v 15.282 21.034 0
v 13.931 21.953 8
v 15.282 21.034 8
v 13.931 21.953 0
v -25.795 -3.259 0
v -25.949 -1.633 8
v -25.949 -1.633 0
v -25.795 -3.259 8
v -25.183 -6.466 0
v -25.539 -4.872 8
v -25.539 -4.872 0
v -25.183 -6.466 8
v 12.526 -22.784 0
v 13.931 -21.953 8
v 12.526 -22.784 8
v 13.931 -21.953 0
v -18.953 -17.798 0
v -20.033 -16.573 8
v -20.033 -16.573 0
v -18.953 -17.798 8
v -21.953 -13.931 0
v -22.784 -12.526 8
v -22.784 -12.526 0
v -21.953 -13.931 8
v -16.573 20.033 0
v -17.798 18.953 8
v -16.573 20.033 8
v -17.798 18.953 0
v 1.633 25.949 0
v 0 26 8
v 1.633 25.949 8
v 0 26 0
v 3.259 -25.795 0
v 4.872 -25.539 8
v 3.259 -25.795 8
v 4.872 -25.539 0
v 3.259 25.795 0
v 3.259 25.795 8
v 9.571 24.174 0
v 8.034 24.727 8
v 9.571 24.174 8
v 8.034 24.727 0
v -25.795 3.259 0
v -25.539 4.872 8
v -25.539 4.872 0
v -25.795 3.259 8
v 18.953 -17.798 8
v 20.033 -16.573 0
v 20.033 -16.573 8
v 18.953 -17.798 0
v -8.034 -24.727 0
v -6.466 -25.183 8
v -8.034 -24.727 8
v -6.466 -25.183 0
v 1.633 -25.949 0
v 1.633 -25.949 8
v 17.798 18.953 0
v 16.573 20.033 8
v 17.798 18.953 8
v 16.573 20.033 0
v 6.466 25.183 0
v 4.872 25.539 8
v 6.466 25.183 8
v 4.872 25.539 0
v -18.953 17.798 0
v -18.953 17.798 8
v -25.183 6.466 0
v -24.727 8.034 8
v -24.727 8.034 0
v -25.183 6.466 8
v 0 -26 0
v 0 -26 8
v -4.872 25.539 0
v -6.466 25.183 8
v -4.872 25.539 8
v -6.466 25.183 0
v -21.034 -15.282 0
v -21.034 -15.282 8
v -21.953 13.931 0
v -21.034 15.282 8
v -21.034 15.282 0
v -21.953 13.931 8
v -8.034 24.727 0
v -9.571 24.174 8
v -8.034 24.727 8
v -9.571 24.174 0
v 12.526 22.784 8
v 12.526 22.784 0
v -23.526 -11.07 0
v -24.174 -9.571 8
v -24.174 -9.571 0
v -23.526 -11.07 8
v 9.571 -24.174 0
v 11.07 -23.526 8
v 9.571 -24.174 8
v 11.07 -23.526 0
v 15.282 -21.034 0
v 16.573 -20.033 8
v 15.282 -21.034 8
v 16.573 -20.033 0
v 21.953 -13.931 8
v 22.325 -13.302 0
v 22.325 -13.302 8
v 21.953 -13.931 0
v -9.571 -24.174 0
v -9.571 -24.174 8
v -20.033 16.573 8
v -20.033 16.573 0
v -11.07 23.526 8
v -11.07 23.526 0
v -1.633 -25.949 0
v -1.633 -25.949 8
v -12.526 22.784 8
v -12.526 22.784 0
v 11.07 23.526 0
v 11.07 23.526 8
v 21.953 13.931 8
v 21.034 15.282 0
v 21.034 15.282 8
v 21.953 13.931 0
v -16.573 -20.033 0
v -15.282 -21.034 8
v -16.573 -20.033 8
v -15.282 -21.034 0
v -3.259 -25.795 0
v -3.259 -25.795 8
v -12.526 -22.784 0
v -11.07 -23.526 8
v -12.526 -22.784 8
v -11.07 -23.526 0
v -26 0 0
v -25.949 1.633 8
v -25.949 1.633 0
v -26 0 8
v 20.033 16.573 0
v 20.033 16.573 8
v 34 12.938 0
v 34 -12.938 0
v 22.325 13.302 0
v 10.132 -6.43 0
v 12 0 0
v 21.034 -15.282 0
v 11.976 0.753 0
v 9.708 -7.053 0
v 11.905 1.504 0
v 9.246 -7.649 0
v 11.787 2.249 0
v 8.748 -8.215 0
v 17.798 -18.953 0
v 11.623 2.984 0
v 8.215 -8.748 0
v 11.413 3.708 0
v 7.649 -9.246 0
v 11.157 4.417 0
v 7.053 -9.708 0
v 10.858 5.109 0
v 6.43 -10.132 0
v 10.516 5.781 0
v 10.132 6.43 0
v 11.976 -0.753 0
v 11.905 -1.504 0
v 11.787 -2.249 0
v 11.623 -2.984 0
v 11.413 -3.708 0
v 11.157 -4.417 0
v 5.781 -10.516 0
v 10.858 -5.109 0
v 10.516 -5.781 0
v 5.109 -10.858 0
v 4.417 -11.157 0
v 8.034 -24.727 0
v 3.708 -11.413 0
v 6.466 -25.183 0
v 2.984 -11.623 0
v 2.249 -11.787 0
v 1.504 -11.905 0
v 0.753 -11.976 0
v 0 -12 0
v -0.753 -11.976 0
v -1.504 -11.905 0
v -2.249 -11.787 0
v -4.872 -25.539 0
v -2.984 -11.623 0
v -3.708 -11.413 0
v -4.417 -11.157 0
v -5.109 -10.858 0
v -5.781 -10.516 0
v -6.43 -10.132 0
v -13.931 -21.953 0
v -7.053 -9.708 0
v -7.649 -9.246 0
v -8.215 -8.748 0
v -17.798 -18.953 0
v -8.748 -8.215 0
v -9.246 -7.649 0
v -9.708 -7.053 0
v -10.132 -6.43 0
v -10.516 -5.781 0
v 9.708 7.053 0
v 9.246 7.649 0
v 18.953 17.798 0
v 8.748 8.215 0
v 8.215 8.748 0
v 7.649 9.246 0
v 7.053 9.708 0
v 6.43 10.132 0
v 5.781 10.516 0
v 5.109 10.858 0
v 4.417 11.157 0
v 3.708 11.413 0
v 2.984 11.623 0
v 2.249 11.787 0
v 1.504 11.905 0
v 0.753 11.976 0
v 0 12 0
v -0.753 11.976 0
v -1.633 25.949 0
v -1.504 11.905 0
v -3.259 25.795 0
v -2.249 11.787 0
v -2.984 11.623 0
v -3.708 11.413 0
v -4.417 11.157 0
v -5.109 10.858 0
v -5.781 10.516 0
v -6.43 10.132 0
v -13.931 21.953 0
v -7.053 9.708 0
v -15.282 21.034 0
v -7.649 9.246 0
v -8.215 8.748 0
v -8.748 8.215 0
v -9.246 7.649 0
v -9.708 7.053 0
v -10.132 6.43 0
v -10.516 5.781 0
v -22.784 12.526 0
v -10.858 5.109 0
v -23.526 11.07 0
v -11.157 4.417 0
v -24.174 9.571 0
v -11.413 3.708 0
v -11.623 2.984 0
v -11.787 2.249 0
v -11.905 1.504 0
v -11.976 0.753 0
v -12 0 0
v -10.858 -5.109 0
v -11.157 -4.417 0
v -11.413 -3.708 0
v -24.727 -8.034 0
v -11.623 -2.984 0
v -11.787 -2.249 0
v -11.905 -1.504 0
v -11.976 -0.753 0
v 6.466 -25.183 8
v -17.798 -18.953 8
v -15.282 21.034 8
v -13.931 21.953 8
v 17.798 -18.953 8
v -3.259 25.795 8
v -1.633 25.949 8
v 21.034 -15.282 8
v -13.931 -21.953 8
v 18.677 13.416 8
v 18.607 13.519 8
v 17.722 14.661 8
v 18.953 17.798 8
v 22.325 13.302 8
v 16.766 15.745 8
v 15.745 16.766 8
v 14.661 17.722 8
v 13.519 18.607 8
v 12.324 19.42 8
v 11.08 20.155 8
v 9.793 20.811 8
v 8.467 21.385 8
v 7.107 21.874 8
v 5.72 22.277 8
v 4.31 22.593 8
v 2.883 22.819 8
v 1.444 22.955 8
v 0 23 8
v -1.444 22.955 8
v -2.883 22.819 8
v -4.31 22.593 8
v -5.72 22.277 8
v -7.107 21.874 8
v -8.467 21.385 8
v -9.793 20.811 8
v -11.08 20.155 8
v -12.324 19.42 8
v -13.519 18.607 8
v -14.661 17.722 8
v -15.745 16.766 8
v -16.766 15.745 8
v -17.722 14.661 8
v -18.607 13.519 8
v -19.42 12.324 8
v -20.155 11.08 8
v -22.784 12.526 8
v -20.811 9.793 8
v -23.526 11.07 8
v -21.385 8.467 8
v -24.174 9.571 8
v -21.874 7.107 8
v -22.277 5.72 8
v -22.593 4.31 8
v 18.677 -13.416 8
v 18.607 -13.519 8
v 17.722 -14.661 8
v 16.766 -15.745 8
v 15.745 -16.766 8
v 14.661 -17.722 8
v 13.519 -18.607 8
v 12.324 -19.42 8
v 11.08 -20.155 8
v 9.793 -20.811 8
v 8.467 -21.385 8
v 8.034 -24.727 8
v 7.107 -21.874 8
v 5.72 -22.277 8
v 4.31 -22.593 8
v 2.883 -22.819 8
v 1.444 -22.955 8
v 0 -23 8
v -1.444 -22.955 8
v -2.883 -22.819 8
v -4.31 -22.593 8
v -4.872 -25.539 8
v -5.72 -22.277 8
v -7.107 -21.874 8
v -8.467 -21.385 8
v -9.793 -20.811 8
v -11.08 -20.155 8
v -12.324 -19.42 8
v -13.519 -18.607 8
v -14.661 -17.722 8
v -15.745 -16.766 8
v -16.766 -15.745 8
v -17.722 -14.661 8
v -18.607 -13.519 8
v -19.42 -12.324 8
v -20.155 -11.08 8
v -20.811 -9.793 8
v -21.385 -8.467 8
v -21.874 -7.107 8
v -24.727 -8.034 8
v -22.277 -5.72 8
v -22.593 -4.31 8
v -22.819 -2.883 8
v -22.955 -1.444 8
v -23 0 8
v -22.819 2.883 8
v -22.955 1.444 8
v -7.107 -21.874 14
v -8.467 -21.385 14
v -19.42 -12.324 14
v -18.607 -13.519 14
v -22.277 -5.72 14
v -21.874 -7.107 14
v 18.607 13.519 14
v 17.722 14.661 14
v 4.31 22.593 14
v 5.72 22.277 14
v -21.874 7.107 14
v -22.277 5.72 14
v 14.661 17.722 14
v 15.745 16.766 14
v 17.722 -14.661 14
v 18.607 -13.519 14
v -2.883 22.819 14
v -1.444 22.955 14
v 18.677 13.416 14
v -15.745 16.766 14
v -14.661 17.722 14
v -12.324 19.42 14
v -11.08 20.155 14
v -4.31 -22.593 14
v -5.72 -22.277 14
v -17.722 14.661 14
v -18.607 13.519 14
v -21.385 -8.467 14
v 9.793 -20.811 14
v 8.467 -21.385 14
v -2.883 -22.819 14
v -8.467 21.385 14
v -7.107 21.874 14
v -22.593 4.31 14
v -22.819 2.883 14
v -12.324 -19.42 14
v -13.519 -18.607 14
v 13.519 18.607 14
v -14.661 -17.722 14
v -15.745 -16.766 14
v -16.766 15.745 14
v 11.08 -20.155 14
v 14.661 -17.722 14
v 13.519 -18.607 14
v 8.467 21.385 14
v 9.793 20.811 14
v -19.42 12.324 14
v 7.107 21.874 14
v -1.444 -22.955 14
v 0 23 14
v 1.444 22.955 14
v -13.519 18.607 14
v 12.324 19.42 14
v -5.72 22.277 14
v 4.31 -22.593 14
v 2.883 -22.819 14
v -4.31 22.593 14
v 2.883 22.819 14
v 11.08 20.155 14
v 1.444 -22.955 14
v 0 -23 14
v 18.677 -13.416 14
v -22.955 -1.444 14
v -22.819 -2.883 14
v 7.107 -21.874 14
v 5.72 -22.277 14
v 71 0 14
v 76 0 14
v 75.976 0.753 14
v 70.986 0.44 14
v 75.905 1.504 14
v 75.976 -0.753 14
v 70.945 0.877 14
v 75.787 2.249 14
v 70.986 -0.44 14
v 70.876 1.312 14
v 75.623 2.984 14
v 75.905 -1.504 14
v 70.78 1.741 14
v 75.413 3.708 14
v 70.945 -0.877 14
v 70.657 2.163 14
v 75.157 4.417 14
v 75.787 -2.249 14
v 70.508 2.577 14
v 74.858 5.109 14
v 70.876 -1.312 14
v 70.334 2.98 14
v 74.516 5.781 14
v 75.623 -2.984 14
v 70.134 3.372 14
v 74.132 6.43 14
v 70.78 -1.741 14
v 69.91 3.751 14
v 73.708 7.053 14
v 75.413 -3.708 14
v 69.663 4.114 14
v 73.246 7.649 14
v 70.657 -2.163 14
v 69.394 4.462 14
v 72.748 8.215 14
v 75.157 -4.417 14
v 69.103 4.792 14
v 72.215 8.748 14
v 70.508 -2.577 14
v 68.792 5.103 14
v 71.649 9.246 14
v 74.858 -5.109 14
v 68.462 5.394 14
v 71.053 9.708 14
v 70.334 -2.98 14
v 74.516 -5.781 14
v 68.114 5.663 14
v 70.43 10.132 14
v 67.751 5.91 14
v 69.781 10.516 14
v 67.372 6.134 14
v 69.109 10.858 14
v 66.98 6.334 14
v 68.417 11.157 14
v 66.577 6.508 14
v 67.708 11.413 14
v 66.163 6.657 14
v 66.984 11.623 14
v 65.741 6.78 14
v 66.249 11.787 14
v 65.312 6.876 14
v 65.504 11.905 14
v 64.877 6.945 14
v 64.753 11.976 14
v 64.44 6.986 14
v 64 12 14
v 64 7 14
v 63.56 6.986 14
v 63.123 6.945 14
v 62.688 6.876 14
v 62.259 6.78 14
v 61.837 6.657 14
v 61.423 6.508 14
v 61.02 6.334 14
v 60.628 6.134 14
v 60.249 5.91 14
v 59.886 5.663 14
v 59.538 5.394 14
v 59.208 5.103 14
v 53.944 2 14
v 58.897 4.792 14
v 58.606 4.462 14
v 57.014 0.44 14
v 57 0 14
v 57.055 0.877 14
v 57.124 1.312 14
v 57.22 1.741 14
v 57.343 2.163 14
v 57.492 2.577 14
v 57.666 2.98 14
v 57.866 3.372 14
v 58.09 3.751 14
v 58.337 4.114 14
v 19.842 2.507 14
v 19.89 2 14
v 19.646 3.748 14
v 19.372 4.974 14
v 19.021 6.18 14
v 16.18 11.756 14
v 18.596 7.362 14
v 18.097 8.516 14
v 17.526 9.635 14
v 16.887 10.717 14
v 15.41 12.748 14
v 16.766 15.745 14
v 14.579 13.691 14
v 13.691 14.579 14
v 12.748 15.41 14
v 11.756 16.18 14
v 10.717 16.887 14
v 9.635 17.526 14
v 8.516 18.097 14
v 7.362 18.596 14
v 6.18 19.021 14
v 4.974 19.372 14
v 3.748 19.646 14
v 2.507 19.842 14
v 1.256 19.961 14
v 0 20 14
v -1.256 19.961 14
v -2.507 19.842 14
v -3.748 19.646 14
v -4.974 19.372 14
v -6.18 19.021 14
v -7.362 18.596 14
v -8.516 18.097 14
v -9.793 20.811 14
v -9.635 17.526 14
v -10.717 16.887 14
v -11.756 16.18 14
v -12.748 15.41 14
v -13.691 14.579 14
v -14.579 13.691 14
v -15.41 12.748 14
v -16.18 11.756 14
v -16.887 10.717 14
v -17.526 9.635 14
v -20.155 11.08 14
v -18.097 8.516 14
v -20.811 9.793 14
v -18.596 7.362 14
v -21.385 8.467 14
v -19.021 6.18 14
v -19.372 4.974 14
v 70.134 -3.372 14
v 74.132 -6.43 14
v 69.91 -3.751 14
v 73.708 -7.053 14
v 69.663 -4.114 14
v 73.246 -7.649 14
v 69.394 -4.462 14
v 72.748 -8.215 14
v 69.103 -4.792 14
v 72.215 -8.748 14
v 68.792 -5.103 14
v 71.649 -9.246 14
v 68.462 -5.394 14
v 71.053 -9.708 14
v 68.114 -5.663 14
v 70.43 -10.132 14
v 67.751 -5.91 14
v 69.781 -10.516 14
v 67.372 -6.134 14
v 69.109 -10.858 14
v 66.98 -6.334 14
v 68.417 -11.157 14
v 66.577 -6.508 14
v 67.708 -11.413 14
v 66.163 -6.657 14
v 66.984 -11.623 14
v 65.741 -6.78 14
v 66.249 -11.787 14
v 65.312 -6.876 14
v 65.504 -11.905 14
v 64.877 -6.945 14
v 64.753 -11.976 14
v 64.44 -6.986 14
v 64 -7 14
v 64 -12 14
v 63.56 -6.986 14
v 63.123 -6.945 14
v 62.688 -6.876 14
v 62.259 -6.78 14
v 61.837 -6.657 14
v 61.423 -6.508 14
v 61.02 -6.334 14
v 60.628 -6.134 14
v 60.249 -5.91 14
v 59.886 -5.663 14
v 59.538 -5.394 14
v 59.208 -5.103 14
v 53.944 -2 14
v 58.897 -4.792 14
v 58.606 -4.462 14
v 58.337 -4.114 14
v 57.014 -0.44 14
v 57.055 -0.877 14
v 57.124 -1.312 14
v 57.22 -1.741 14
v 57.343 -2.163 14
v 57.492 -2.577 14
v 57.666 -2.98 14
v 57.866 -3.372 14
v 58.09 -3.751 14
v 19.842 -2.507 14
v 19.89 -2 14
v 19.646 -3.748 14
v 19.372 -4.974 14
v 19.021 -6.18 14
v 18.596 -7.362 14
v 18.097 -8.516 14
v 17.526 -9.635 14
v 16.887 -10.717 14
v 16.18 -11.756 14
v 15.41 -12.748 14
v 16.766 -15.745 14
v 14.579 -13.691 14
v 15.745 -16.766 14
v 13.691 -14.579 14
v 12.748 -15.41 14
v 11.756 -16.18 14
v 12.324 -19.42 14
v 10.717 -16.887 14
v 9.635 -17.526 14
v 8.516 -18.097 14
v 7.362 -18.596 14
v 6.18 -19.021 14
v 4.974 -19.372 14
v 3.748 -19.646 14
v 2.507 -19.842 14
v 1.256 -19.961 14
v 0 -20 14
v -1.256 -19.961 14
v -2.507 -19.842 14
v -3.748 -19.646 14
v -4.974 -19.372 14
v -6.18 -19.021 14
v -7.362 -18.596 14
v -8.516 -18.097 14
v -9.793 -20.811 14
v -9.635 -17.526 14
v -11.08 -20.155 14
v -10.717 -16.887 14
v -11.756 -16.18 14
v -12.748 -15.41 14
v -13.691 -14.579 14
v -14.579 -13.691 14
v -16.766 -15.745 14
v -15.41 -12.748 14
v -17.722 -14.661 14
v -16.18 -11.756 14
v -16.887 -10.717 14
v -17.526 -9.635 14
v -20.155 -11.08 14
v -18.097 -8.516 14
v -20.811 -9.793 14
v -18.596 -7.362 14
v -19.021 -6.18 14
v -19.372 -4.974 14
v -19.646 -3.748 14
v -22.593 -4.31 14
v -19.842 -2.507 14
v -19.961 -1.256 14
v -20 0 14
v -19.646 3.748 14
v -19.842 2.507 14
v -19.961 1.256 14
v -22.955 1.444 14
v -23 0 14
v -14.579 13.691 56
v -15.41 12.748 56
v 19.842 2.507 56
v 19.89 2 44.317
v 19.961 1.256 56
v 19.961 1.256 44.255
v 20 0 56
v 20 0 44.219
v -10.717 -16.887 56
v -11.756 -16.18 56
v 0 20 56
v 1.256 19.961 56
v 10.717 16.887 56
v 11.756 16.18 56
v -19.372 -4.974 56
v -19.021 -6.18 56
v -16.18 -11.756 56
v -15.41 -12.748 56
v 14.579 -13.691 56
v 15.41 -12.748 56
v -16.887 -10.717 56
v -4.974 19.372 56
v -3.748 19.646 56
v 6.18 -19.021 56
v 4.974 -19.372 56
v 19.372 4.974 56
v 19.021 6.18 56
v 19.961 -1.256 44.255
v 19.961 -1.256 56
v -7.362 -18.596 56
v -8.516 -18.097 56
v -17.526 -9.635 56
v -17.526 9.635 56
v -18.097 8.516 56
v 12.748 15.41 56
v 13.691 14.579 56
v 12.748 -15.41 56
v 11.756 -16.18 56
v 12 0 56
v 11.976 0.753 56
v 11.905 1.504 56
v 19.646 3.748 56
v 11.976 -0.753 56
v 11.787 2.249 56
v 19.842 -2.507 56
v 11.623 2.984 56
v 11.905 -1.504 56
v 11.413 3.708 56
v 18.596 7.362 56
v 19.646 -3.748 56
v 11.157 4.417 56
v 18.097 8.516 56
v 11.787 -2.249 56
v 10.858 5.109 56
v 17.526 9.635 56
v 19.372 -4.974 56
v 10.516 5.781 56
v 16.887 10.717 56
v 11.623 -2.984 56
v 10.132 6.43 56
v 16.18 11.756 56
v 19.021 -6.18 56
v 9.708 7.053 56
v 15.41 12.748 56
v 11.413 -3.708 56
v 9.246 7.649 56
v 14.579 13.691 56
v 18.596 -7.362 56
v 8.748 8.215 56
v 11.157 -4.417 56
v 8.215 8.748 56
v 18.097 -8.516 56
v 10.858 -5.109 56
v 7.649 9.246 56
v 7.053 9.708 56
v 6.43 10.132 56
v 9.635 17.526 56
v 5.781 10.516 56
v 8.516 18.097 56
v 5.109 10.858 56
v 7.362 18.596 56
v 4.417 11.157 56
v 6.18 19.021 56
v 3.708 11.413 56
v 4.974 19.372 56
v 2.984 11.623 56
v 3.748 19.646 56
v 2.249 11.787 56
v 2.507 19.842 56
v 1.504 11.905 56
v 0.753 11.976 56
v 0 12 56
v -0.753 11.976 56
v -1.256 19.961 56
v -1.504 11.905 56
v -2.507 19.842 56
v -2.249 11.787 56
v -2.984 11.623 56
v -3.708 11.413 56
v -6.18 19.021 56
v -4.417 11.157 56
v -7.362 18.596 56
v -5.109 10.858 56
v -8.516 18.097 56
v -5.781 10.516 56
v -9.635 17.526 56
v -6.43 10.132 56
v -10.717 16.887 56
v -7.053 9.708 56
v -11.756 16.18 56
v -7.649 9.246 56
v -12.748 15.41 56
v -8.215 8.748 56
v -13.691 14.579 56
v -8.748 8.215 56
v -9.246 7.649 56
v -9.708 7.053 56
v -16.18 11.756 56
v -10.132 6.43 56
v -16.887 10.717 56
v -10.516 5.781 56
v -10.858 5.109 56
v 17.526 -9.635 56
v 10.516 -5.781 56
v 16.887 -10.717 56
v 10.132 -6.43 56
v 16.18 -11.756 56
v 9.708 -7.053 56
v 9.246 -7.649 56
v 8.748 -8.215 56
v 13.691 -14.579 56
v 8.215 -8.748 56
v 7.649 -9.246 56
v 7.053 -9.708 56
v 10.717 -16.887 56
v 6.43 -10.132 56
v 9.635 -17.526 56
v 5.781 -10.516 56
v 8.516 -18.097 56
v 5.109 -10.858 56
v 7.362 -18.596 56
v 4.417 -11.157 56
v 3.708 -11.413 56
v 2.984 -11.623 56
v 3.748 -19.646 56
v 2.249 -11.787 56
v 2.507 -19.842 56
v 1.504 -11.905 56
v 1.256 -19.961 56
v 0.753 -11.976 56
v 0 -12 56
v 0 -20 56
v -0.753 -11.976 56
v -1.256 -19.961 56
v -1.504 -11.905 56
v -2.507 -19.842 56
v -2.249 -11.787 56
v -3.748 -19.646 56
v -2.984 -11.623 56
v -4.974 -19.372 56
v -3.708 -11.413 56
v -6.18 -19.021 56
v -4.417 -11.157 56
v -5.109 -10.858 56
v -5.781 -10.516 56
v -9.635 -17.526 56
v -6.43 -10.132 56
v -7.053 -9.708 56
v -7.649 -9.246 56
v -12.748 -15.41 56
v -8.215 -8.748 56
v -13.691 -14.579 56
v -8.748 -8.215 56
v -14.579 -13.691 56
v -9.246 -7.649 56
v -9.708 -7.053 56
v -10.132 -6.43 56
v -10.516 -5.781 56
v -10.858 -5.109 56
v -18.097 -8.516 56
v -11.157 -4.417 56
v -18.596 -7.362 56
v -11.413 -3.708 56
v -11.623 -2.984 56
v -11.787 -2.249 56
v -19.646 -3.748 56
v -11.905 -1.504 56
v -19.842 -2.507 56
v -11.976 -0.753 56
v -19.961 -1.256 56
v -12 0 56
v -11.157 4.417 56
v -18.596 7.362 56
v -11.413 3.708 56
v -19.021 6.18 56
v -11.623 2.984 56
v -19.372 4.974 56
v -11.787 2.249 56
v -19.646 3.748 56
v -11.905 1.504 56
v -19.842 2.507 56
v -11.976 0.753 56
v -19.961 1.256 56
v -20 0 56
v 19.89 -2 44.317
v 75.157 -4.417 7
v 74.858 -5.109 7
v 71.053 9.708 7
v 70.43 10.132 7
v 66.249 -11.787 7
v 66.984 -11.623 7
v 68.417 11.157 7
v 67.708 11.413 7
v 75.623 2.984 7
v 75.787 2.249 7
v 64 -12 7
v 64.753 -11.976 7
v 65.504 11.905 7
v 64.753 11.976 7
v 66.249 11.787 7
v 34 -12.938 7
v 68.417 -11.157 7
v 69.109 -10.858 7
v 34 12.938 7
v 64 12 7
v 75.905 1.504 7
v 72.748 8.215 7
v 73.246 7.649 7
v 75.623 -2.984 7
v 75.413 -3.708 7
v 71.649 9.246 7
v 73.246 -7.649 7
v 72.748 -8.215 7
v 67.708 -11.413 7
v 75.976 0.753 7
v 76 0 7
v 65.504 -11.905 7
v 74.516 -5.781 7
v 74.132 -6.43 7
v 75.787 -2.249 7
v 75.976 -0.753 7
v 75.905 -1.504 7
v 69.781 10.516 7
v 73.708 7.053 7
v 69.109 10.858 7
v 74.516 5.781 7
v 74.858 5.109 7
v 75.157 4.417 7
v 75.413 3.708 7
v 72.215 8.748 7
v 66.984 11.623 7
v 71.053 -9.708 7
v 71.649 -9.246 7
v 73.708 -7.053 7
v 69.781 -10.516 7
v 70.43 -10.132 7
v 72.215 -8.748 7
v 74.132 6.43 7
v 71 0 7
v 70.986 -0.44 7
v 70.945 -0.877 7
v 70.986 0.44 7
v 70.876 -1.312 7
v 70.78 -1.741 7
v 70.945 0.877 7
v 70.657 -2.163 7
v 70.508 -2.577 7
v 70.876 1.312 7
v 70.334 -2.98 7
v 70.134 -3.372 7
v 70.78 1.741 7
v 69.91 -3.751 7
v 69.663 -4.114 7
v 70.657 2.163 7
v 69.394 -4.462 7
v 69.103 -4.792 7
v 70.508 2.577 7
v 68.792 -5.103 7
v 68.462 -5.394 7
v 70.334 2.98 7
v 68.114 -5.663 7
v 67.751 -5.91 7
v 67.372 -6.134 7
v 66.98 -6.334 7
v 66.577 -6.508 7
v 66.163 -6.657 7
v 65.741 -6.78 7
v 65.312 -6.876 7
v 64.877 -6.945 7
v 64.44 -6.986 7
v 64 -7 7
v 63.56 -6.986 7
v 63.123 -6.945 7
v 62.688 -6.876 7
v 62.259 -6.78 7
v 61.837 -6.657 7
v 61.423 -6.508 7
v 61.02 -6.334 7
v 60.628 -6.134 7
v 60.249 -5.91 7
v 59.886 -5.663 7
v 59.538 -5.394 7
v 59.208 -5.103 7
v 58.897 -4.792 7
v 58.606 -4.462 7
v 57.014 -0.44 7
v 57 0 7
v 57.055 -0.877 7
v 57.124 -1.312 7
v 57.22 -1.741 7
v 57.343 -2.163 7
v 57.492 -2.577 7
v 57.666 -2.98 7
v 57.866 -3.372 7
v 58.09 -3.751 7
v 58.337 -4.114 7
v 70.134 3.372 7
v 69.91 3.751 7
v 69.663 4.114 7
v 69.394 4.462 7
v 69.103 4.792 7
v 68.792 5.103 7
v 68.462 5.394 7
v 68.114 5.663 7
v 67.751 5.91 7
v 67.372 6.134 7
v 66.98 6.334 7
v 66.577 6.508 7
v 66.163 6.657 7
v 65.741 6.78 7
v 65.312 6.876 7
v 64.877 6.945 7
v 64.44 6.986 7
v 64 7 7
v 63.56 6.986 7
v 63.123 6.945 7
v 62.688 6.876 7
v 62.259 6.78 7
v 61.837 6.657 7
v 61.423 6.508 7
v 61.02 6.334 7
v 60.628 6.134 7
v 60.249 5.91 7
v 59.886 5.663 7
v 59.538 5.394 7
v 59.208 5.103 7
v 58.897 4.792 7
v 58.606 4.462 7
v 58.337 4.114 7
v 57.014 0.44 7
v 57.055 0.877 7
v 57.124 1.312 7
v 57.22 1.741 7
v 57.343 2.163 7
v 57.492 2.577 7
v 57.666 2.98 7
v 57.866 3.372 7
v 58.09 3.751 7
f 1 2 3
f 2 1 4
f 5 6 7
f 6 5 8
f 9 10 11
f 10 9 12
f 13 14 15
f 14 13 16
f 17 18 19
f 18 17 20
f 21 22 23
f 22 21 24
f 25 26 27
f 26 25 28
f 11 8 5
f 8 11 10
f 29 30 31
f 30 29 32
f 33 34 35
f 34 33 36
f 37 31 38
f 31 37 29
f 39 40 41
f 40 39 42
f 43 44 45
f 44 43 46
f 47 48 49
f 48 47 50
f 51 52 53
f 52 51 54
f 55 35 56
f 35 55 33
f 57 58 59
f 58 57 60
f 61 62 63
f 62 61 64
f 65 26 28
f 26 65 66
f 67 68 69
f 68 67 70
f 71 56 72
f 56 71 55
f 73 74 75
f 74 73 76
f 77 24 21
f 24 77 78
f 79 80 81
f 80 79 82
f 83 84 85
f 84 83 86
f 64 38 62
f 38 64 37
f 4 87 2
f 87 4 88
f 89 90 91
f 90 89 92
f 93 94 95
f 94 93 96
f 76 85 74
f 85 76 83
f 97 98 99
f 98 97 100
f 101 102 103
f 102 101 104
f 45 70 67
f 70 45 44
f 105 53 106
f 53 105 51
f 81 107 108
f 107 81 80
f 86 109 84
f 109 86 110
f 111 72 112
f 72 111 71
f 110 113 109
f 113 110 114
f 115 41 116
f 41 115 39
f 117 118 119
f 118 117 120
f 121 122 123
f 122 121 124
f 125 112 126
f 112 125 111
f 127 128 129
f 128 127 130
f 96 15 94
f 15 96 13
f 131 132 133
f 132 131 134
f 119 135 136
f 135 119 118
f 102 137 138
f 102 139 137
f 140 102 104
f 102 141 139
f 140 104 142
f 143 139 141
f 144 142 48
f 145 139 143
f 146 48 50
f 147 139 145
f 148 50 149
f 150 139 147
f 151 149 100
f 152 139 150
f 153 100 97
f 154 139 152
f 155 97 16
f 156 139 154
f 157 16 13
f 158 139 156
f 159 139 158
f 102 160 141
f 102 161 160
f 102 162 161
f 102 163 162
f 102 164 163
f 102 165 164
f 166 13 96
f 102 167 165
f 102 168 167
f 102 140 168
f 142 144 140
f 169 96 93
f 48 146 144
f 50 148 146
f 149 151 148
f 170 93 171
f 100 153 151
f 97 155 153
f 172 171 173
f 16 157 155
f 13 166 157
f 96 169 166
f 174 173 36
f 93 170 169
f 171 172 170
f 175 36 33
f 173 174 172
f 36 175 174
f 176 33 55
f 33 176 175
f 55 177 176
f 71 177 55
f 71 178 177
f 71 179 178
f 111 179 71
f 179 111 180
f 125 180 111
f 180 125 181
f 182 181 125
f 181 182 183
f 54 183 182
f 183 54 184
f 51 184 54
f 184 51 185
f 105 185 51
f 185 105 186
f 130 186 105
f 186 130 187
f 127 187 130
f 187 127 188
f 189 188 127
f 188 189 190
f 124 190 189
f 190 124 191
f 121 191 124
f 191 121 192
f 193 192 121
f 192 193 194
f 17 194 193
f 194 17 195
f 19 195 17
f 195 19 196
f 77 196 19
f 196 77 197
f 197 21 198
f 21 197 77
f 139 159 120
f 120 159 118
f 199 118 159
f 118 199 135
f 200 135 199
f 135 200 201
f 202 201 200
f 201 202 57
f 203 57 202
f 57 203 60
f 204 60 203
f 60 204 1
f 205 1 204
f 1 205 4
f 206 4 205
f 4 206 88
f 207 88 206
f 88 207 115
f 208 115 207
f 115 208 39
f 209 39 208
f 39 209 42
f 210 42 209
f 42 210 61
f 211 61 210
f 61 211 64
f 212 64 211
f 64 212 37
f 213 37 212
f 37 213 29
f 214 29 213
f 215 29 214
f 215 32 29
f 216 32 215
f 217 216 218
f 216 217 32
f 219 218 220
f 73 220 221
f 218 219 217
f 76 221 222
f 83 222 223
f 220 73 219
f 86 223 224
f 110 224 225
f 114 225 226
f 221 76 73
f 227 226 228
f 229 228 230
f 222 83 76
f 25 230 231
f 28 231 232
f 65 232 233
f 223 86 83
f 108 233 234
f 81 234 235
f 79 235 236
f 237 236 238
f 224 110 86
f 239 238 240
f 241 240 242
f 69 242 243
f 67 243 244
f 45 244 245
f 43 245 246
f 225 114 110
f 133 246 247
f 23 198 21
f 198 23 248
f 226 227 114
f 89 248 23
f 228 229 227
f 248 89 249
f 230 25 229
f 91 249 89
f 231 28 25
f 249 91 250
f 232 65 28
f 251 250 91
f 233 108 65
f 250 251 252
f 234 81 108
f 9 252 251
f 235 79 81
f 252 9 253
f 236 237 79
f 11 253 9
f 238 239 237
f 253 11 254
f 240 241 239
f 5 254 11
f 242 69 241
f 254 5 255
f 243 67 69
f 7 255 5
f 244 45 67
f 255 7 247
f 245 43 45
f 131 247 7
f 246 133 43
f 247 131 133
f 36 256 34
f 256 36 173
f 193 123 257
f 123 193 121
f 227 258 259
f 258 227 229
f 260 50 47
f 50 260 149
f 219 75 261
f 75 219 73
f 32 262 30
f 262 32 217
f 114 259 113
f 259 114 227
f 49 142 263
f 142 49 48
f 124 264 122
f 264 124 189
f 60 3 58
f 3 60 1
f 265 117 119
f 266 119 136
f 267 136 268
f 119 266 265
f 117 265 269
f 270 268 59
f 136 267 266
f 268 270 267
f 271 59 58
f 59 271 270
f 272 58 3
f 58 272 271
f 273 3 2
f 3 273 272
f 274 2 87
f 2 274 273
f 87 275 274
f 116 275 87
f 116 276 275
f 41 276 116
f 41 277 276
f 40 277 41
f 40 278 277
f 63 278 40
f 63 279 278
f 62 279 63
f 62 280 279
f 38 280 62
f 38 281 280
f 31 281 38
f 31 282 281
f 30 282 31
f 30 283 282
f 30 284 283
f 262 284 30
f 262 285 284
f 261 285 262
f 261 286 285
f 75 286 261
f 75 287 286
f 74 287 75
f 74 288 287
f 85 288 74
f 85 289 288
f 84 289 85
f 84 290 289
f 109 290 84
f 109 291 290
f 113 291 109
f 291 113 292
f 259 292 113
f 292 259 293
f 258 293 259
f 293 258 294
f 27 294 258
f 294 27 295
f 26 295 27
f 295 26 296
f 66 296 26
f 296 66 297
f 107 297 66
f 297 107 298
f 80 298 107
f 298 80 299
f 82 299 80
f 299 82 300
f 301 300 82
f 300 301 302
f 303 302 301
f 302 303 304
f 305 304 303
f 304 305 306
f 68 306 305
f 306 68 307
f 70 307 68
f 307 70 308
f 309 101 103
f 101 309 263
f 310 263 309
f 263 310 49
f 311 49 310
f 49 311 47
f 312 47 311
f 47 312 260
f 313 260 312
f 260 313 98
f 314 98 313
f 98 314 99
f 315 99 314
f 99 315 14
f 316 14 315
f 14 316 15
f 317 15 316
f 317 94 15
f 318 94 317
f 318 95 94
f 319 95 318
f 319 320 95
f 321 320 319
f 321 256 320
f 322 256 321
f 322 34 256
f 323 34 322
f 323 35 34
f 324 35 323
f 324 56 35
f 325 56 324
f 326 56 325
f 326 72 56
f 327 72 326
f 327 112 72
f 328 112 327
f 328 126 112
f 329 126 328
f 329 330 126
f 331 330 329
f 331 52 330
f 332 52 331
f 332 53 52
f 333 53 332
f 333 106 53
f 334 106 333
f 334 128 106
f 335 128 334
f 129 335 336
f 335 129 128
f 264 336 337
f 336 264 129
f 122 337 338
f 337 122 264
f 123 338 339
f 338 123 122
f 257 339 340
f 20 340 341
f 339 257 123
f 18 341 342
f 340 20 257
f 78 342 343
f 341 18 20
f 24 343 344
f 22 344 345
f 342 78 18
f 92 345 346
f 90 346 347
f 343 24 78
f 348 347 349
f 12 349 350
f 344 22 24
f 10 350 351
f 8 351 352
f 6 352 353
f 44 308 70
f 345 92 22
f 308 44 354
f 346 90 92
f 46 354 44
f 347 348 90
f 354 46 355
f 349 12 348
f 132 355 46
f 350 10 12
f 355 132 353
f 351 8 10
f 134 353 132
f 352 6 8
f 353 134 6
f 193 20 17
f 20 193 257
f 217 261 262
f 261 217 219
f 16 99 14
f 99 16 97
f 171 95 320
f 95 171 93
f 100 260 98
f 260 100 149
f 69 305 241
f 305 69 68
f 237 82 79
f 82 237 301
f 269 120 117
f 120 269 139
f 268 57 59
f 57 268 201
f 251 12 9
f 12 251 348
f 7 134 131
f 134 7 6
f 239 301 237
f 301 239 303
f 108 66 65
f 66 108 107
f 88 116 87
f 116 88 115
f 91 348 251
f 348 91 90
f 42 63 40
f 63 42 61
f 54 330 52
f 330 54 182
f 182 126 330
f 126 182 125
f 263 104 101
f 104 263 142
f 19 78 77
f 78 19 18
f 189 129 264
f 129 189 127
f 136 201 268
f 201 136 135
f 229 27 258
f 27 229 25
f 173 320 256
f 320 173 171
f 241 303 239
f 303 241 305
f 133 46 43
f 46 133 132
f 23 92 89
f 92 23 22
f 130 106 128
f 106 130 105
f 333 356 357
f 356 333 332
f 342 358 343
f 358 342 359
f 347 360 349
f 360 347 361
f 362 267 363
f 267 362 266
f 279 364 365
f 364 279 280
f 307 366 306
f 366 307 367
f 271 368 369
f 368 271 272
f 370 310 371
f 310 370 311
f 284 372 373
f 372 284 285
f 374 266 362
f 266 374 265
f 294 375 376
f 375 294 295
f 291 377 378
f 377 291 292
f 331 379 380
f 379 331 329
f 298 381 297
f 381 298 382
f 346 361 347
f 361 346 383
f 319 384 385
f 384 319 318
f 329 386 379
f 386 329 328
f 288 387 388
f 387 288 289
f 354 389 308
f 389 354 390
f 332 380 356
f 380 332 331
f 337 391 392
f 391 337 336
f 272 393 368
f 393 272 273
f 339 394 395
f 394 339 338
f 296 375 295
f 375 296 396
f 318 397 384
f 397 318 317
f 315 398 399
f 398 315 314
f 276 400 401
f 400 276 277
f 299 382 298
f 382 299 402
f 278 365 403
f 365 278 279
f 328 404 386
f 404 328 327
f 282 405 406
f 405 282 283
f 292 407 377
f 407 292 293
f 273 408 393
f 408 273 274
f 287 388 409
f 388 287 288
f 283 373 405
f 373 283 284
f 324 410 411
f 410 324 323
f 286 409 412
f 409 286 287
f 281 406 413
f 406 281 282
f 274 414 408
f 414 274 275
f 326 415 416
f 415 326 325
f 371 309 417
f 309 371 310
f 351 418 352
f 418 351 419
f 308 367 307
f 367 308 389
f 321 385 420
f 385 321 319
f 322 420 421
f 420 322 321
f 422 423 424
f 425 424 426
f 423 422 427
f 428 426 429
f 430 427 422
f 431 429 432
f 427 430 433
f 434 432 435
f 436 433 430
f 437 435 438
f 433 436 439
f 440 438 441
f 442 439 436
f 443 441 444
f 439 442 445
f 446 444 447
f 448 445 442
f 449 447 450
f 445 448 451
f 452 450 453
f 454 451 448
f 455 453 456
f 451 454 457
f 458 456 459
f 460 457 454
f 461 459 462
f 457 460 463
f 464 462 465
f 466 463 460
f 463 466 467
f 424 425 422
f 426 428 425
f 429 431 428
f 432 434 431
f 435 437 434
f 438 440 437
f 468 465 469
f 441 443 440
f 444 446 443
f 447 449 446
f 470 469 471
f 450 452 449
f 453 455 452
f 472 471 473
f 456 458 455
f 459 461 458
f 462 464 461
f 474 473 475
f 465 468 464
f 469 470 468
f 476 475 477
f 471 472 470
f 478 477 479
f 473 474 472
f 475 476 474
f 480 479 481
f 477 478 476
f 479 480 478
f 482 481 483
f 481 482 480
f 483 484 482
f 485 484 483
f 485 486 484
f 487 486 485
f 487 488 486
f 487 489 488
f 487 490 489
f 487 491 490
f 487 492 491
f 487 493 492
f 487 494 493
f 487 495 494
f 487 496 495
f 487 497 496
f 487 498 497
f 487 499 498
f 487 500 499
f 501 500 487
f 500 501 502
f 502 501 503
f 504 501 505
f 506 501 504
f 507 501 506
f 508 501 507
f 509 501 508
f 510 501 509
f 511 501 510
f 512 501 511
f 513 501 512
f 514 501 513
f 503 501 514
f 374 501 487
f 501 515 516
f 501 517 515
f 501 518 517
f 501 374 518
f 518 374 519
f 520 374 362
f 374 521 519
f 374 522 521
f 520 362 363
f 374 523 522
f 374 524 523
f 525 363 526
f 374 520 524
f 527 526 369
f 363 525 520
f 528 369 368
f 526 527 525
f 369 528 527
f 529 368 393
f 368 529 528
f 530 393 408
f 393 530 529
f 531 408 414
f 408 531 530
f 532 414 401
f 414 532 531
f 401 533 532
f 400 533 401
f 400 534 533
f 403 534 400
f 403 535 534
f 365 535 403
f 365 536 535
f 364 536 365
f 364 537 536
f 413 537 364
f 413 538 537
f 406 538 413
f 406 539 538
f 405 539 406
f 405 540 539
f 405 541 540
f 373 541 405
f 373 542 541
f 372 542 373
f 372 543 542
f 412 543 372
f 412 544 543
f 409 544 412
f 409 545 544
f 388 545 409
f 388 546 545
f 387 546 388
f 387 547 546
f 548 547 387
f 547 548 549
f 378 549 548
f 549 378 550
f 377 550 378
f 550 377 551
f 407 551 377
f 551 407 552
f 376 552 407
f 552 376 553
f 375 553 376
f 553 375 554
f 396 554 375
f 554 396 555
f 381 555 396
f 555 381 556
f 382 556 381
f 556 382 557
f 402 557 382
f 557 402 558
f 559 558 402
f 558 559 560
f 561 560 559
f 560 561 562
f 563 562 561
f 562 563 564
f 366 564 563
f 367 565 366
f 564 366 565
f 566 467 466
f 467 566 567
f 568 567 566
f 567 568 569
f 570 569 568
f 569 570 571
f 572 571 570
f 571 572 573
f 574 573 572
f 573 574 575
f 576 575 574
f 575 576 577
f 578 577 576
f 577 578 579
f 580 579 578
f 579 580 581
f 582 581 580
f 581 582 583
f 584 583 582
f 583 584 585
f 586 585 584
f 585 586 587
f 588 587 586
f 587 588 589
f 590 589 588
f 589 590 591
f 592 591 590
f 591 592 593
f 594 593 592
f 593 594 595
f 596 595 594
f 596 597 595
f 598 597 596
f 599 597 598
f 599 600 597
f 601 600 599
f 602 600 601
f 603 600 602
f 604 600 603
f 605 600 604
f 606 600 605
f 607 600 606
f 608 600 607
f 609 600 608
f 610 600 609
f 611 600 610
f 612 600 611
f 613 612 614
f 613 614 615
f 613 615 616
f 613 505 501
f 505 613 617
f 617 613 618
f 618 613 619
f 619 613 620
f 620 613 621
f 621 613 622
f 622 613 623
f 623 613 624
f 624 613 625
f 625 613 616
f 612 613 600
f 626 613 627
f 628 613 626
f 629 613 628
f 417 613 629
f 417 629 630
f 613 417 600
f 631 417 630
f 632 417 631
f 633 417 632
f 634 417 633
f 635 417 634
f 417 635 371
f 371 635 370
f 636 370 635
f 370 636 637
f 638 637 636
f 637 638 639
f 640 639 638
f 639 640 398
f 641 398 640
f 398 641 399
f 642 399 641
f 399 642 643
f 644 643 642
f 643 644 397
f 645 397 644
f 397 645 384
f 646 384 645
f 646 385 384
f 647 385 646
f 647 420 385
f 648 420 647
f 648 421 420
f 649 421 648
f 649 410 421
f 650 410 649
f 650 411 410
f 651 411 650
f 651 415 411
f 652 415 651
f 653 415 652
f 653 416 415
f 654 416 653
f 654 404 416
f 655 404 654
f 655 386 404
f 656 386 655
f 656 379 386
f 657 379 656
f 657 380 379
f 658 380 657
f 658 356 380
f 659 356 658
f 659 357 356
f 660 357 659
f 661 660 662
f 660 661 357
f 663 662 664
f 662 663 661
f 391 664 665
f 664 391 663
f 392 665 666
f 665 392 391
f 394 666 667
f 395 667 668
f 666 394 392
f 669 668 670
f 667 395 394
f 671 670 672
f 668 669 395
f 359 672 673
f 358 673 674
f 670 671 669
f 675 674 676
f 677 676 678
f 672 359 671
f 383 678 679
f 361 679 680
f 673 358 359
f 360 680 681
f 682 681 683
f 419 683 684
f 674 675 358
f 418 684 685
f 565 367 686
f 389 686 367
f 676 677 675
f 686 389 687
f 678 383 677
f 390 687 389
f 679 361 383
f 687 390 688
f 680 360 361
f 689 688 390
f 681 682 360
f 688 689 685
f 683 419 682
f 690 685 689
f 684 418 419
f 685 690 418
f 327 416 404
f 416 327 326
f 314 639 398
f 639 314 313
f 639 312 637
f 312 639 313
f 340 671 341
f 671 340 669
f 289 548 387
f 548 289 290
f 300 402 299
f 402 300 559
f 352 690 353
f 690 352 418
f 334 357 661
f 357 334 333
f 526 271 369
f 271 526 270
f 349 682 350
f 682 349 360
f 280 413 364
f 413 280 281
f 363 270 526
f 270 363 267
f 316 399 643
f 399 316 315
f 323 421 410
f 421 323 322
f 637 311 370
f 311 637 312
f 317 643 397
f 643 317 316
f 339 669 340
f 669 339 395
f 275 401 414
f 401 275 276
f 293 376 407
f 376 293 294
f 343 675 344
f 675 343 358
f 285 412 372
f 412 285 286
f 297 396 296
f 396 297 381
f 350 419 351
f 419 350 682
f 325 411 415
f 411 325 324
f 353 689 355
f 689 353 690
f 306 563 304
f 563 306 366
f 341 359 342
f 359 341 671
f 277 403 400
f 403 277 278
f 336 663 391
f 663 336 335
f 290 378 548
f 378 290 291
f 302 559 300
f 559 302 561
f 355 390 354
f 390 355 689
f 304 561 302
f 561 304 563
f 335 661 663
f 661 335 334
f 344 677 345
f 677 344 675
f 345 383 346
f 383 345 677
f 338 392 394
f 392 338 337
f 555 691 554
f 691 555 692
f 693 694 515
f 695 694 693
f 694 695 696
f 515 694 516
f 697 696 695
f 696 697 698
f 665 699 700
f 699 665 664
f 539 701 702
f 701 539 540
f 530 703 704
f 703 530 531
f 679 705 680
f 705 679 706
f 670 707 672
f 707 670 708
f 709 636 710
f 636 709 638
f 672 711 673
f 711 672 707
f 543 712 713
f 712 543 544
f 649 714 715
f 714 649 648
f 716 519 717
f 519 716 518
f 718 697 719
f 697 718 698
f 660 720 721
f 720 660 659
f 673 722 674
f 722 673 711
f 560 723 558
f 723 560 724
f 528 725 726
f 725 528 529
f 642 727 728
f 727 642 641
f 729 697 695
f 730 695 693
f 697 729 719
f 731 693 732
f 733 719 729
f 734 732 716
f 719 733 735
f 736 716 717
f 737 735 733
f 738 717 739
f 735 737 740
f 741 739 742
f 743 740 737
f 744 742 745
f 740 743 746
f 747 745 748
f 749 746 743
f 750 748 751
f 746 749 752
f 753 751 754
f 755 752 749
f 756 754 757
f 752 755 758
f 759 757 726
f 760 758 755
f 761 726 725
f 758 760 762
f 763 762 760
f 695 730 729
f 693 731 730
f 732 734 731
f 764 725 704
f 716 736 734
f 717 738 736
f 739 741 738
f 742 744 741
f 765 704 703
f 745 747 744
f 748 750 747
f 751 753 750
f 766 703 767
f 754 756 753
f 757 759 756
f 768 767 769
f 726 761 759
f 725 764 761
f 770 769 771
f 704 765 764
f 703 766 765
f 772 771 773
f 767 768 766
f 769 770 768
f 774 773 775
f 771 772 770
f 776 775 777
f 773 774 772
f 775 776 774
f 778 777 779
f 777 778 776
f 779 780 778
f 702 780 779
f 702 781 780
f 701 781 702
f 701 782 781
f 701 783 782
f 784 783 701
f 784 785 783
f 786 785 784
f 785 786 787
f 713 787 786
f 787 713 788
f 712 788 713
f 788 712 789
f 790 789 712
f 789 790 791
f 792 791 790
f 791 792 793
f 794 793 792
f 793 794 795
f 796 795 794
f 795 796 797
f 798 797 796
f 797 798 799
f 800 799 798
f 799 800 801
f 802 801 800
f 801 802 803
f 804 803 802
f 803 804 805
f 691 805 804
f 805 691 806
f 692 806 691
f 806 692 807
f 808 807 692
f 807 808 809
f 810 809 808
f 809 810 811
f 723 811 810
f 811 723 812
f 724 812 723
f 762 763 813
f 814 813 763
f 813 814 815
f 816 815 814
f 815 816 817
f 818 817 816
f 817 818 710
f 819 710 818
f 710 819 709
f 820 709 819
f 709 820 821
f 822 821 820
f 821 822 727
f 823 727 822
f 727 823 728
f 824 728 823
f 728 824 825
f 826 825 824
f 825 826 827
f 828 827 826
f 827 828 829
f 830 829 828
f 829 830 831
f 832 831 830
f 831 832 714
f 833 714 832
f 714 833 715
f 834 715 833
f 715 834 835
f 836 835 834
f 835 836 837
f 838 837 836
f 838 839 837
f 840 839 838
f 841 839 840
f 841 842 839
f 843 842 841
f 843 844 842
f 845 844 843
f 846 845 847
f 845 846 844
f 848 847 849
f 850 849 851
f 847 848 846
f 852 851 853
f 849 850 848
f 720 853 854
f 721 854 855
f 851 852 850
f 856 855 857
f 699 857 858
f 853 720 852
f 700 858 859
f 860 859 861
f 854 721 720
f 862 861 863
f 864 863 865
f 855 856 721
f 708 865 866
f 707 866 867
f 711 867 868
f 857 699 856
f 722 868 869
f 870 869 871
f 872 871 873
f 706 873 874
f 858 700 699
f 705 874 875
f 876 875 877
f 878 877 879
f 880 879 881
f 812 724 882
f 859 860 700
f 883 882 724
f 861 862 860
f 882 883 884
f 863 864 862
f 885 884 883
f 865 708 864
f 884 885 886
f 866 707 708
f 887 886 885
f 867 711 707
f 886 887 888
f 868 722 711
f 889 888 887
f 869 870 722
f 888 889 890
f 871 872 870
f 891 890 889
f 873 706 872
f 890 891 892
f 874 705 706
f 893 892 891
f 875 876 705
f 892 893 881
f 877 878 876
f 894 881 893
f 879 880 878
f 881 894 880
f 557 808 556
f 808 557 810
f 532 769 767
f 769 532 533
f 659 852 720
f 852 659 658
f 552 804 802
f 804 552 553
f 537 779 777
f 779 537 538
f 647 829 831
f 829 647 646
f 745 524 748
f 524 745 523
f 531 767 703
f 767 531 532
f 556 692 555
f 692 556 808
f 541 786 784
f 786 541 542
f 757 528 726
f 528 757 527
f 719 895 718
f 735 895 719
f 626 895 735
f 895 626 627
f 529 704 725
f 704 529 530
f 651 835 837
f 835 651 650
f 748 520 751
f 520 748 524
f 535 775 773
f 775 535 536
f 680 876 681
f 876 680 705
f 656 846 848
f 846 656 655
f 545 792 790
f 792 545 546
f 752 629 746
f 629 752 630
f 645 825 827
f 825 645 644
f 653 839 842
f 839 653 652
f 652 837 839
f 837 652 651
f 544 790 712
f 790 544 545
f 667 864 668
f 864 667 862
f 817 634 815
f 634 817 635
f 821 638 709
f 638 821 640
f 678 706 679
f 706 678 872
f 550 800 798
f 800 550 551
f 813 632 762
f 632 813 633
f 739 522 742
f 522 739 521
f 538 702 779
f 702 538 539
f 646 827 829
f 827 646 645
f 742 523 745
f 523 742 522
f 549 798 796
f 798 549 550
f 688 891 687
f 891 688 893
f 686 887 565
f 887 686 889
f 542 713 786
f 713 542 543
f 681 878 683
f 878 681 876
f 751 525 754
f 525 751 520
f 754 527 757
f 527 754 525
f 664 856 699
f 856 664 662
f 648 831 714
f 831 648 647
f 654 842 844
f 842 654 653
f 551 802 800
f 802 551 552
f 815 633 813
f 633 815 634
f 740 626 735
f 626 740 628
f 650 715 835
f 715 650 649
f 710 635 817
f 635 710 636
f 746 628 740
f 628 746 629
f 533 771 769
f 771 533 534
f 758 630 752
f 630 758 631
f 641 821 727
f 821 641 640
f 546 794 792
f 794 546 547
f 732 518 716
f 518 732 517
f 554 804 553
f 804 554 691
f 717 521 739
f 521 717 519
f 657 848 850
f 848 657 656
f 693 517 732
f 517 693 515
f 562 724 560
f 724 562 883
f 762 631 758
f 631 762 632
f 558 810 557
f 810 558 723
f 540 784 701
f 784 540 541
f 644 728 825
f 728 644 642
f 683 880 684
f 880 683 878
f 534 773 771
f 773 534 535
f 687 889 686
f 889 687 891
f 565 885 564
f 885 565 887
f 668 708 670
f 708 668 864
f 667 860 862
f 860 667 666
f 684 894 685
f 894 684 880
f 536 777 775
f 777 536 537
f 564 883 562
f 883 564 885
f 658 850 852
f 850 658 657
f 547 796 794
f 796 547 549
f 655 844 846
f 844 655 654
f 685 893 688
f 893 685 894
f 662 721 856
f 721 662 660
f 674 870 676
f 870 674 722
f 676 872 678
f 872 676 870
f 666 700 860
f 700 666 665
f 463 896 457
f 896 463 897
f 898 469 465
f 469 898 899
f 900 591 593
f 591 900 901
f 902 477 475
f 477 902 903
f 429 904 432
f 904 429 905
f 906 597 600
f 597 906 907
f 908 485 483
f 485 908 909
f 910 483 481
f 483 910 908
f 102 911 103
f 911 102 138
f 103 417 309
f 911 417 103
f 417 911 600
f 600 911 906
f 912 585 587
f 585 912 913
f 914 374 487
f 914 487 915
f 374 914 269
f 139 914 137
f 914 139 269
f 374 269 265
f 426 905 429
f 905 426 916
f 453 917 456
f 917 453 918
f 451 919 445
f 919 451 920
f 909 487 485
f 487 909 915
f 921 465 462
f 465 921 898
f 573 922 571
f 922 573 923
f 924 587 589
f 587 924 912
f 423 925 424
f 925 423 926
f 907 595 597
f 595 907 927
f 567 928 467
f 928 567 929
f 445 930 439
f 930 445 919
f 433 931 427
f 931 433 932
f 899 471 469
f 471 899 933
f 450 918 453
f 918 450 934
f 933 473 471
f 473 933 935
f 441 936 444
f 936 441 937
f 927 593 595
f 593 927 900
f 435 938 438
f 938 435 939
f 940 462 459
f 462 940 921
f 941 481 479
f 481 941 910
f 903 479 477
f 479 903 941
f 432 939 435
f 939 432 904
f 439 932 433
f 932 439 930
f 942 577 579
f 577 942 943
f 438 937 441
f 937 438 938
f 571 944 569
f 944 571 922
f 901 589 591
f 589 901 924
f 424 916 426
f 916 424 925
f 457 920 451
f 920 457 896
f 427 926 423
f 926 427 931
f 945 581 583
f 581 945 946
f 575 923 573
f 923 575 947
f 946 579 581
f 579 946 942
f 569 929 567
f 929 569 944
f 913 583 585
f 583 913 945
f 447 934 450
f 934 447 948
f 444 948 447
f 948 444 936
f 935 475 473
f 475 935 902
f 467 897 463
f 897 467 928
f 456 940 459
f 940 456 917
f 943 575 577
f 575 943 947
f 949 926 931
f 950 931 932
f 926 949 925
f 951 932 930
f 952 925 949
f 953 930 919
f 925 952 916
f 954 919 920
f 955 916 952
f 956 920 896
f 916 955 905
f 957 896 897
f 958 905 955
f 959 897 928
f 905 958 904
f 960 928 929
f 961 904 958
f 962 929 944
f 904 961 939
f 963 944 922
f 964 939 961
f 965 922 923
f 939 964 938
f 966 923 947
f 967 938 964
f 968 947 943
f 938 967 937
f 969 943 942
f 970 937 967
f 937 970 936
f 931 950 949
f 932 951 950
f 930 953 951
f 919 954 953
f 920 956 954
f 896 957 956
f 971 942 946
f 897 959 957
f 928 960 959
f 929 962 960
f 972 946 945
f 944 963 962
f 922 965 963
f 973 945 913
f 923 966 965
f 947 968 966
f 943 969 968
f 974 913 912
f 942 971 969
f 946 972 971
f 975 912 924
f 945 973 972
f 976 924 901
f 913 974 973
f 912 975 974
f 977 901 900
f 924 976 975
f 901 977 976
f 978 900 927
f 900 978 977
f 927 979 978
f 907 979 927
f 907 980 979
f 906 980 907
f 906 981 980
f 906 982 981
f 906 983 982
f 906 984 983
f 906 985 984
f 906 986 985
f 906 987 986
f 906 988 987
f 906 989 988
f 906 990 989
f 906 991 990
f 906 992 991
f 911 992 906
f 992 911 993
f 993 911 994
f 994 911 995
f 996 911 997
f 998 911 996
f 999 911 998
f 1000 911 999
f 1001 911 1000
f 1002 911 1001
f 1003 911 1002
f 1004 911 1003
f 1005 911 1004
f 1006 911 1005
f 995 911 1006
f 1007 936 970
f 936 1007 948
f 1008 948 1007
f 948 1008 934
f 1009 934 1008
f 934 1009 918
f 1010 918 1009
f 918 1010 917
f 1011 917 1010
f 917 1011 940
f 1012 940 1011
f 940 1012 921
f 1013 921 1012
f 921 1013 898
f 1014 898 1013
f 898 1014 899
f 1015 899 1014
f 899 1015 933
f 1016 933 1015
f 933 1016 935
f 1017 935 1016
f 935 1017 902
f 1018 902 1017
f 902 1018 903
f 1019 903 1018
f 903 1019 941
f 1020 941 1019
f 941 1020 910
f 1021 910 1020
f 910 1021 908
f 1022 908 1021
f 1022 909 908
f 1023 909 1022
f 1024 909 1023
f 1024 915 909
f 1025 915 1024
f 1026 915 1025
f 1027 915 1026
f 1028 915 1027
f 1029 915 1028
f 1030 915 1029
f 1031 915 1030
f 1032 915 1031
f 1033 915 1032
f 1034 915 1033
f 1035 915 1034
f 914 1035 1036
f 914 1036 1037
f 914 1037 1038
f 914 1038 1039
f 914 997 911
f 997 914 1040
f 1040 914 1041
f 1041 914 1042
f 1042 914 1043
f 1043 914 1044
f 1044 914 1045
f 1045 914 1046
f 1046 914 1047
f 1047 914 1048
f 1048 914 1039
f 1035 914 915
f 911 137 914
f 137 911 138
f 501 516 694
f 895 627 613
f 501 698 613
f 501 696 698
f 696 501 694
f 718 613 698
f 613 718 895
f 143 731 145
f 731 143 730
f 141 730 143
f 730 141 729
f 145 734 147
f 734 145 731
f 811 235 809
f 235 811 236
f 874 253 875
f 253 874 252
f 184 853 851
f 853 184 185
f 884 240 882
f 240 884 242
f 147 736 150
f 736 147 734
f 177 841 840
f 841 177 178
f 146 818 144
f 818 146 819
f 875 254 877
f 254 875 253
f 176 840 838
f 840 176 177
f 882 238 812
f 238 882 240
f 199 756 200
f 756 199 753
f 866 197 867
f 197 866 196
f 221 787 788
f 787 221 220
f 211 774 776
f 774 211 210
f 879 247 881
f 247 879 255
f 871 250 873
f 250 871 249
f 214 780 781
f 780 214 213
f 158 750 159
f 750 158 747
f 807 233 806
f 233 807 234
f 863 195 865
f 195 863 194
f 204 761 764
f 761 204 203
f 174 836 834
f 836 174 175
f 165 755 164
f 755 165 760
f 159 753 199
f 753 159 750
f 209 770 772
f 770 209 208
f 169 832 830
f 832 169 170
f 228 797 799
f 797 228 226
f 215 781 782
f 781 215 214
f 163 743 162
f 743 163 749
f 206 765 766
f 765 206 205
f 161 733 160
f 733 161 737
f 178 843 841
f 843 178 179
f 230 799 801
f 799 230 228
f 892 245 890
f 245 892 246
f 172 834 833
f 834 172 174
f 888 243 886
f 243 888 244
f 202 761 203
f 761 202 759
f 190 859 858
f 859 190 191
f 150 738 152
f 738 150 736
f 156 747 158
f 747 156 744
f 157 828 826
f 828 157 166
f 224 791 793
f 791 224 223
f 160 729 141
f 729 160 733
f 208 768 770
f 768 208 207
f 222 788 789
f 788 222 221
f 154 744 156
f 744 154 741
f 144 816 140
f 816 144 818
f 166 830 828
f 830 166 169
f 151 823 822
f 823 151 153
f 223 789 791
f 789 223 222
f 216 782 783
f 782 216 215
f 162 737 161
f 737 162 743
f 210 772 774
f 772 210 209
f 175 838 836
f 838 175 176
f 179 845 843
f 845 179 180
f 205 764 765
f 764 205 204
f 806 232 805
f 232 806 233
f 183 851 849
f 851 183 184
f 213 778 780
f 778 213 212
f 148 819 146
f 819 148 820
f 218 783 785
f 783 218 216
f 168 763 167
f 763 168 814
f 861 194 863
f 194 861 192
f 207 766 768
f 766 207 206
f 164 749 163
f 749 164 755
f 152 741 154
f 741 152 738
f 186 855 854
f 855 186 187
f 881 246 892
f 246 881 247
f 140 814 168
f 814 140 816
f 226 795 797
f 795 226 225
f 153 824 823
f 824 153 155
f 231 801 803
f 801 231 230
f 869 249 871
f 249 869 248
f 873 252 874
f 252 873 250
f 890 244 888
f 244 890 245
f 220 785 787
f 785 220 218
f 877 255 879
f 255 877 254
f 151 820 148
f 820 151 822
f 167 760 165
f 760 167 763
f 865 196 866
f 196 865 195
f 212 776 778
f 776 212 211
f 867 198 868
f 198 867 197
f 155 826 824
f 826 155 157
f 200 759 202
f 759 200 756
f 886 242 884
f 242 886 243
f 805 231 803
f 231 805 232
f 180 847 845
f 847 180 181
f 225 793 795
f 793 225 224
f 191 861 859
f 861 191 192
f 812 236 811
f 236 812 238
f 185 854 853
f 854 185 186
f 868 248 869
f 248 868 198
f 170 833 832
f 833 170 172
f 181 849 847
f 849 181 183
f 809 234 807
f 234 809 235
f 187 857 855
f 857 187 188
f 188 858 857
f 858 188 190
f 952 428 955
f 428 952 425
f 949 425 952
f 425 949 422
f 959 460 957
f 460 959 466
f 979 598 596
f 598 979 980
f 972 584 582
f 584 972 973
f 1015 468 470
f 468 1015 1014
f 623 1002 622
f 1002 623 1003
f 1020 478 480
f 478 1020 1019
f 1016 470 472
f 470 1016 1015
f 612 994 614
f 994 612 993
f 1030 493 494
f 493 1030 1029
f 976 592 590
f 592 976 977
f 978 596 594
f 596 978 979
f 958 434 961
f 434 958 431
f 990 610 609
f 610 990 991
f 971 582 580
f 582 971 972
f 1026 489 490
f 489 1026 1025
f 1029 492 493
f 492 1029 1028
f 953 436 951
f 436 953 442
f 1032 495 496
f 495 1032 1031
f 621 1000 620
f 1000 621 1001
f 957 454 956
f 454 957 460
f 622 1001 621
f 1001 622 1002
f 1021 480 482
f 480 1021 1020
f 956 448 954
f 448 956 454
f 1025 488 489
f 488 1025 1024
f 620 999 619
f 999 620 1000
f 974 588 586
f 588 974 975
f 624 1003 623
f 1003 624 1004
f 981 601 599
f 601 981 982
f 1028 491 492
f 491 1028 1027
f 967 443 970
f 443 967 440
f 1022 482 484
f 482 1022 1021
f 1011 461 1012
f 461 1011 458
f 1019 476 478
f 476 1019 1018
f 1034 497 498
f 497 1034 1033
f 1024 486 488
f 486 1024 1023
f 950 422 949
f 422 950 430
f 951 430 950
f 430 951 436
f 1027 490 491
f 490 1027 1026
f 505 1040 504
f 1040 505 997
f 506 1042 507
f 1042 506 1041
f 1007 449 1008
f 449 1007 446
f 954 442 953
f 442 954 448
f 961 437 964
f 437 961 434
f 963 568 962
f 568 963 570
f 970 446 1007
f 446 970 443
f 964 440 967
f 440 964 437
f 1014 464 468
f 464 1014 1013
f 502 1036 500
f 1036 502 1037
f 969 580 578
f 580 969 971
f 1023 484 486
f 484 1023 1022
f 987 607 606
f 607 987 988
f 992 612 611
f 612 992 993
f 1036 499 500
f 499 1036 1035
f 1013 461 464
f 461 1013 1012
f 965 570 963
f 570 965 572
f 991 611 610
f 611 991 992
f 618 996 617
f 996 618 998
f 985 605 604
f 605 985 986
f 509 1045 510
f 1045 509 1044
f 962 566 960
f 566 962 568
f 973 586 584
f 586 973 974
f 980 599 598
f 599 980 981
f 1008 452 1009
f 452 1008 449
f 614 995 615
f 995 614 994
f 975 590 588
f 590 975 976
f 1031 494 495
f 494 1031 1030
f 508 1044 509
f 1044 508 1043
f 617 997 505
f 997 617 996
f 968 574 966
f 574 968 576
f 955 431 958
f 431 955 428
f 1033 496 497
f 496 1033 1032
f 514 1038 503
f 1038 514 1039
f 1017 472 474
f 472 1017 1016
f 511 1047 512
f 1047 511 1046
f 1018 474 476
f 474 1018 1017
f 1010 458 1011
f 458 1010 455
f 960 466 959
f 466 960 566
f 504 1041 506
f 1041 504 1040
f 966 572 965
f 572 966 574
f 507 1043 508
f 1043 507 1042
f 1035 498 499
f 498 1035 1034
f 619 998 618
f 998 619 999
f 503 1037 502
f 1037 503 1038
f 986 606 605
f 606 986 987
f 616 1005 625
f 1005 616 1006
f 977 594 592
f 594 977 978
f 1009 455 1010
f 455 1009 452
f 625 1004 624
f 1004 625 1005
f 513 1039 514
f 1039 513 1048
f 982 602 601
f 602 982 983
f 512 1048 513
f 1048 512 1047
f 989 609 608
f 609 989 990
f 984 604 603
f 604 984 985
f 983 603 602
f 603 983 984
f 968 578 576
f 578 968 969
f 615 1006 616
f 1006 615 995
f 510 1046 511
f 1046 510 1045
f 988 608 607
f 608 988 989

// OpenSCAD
// Parameters — millimeters
base_diameter = 52;
base_height = 8;

shoulder_diameter = 46;
shoulder_height = 6;

sleeve_outer_diameter = 40;
sleeve_height = 42;
bore_diameter = 24;

arm_length = 64;              // Sleeve axis to rounded-end axis
arm_root_width = 28;
arm_end_diameter = 24;
arm_height = 14;
cutaway_start = 34;            // Distance from sleeve axis
cutaway_height = 7;

end_hole_diameter = 14;

rib_thickness = 4;
rib_height = 32;
rib_sleeve_overlap = 2;
rib_hole_clearance = 3;

epsilon = 0.05;
$fn = 100;

// Derived dimensions
shoulder_z = base_height;
sleeve_z = base_height + shoulder_height;
total_height = sleeve_z + sleeve_height;
rib_root_x = sleeve_outer_diameter / 2 - rib_sleeve_overlap;
rib_tip_x = arm_length - end_hole_diameter / 2 - rib_hole_clearance;
cutaway_end = arm_length + arm_end_diameter / 2 + epsilon;
cutaway_width = max(arm_root_width, arm_end_diameter) + 2 * epsilon;

// Parameter checks
assert(bore_diameter < min(base_diameter,
                          shoulder_diameter,
                          sleeve_outer_diameter));
assert(end_hole_diameter < arm_end_diameter);
assert(cutaway_height > 0 && cutaway_height < arm_height);
assert(cutaway_start > base_diameter / 2);
assert(rib_tip_x > rib_root_x);
assert(arm_height + rib_height <= total_height);

// Stepped circular body
module stepped_upright() {
    union() {
        cylinder(d = base_diameter, h = base_height);

        translate([0, 0, shoulder_z - epsilon])
            cylinder(d = shoulder_diameter,
                     h = shoulder_height + epsilon);

        translate([0, 0, sleeve_z - epsilon])
            cylinder(d = sleeve_outer_diameter,
                     h = sleeve_height + epsilon);
    }
}

// Rounded arm outline
module arm_profile() {
    hull() {
        circle(d = arm_root_width);
        translate([arm_length, 0])
            circle(d = arm_end_diameter);
    }
}

// Raised outer tier from underside cutaway
module stepped_arm() {
    difference() {
        linear_extrude(height = arm_height)
            arm_profile();

        translate([cutaway_start, -cutaway_width / 2, -epsilon])
            cube([cutaway_end - cutaway_start,
                  cutaway_width,
                  cutaway_height + epsilon]);
    }
}

// Thin triangular web, embedded into arm and sleeve
module triangular_rib() {
    translate([0, 0, arm_height - epsilon])
        rotate([90, 0, 0])
            linear_extrude(height = rib_thickness, center = true)
                polygon(points = [
                    [rib_root_x, 0],
                    [rib_tip_x, 0],
                    [rib_root_x, rib_height + epsilon]
                ]);
}

// Full-depth circular openings
module through_openings() {
    translate([0, 0, -epsilon])
        cylinder(d = bore_diameter,
                 h = total_height + 2 * epsilon);

    translate([arm_length, 0, -epsilon])
        cylinder(d = end_hole_diameter,
                 h = total_height + 2 * epsilon);
}

// Main model
difference() {
    union() {
        stepped_upright();
        stepped_arm();
        triangular_rib();
    }
    through_openings();
}
